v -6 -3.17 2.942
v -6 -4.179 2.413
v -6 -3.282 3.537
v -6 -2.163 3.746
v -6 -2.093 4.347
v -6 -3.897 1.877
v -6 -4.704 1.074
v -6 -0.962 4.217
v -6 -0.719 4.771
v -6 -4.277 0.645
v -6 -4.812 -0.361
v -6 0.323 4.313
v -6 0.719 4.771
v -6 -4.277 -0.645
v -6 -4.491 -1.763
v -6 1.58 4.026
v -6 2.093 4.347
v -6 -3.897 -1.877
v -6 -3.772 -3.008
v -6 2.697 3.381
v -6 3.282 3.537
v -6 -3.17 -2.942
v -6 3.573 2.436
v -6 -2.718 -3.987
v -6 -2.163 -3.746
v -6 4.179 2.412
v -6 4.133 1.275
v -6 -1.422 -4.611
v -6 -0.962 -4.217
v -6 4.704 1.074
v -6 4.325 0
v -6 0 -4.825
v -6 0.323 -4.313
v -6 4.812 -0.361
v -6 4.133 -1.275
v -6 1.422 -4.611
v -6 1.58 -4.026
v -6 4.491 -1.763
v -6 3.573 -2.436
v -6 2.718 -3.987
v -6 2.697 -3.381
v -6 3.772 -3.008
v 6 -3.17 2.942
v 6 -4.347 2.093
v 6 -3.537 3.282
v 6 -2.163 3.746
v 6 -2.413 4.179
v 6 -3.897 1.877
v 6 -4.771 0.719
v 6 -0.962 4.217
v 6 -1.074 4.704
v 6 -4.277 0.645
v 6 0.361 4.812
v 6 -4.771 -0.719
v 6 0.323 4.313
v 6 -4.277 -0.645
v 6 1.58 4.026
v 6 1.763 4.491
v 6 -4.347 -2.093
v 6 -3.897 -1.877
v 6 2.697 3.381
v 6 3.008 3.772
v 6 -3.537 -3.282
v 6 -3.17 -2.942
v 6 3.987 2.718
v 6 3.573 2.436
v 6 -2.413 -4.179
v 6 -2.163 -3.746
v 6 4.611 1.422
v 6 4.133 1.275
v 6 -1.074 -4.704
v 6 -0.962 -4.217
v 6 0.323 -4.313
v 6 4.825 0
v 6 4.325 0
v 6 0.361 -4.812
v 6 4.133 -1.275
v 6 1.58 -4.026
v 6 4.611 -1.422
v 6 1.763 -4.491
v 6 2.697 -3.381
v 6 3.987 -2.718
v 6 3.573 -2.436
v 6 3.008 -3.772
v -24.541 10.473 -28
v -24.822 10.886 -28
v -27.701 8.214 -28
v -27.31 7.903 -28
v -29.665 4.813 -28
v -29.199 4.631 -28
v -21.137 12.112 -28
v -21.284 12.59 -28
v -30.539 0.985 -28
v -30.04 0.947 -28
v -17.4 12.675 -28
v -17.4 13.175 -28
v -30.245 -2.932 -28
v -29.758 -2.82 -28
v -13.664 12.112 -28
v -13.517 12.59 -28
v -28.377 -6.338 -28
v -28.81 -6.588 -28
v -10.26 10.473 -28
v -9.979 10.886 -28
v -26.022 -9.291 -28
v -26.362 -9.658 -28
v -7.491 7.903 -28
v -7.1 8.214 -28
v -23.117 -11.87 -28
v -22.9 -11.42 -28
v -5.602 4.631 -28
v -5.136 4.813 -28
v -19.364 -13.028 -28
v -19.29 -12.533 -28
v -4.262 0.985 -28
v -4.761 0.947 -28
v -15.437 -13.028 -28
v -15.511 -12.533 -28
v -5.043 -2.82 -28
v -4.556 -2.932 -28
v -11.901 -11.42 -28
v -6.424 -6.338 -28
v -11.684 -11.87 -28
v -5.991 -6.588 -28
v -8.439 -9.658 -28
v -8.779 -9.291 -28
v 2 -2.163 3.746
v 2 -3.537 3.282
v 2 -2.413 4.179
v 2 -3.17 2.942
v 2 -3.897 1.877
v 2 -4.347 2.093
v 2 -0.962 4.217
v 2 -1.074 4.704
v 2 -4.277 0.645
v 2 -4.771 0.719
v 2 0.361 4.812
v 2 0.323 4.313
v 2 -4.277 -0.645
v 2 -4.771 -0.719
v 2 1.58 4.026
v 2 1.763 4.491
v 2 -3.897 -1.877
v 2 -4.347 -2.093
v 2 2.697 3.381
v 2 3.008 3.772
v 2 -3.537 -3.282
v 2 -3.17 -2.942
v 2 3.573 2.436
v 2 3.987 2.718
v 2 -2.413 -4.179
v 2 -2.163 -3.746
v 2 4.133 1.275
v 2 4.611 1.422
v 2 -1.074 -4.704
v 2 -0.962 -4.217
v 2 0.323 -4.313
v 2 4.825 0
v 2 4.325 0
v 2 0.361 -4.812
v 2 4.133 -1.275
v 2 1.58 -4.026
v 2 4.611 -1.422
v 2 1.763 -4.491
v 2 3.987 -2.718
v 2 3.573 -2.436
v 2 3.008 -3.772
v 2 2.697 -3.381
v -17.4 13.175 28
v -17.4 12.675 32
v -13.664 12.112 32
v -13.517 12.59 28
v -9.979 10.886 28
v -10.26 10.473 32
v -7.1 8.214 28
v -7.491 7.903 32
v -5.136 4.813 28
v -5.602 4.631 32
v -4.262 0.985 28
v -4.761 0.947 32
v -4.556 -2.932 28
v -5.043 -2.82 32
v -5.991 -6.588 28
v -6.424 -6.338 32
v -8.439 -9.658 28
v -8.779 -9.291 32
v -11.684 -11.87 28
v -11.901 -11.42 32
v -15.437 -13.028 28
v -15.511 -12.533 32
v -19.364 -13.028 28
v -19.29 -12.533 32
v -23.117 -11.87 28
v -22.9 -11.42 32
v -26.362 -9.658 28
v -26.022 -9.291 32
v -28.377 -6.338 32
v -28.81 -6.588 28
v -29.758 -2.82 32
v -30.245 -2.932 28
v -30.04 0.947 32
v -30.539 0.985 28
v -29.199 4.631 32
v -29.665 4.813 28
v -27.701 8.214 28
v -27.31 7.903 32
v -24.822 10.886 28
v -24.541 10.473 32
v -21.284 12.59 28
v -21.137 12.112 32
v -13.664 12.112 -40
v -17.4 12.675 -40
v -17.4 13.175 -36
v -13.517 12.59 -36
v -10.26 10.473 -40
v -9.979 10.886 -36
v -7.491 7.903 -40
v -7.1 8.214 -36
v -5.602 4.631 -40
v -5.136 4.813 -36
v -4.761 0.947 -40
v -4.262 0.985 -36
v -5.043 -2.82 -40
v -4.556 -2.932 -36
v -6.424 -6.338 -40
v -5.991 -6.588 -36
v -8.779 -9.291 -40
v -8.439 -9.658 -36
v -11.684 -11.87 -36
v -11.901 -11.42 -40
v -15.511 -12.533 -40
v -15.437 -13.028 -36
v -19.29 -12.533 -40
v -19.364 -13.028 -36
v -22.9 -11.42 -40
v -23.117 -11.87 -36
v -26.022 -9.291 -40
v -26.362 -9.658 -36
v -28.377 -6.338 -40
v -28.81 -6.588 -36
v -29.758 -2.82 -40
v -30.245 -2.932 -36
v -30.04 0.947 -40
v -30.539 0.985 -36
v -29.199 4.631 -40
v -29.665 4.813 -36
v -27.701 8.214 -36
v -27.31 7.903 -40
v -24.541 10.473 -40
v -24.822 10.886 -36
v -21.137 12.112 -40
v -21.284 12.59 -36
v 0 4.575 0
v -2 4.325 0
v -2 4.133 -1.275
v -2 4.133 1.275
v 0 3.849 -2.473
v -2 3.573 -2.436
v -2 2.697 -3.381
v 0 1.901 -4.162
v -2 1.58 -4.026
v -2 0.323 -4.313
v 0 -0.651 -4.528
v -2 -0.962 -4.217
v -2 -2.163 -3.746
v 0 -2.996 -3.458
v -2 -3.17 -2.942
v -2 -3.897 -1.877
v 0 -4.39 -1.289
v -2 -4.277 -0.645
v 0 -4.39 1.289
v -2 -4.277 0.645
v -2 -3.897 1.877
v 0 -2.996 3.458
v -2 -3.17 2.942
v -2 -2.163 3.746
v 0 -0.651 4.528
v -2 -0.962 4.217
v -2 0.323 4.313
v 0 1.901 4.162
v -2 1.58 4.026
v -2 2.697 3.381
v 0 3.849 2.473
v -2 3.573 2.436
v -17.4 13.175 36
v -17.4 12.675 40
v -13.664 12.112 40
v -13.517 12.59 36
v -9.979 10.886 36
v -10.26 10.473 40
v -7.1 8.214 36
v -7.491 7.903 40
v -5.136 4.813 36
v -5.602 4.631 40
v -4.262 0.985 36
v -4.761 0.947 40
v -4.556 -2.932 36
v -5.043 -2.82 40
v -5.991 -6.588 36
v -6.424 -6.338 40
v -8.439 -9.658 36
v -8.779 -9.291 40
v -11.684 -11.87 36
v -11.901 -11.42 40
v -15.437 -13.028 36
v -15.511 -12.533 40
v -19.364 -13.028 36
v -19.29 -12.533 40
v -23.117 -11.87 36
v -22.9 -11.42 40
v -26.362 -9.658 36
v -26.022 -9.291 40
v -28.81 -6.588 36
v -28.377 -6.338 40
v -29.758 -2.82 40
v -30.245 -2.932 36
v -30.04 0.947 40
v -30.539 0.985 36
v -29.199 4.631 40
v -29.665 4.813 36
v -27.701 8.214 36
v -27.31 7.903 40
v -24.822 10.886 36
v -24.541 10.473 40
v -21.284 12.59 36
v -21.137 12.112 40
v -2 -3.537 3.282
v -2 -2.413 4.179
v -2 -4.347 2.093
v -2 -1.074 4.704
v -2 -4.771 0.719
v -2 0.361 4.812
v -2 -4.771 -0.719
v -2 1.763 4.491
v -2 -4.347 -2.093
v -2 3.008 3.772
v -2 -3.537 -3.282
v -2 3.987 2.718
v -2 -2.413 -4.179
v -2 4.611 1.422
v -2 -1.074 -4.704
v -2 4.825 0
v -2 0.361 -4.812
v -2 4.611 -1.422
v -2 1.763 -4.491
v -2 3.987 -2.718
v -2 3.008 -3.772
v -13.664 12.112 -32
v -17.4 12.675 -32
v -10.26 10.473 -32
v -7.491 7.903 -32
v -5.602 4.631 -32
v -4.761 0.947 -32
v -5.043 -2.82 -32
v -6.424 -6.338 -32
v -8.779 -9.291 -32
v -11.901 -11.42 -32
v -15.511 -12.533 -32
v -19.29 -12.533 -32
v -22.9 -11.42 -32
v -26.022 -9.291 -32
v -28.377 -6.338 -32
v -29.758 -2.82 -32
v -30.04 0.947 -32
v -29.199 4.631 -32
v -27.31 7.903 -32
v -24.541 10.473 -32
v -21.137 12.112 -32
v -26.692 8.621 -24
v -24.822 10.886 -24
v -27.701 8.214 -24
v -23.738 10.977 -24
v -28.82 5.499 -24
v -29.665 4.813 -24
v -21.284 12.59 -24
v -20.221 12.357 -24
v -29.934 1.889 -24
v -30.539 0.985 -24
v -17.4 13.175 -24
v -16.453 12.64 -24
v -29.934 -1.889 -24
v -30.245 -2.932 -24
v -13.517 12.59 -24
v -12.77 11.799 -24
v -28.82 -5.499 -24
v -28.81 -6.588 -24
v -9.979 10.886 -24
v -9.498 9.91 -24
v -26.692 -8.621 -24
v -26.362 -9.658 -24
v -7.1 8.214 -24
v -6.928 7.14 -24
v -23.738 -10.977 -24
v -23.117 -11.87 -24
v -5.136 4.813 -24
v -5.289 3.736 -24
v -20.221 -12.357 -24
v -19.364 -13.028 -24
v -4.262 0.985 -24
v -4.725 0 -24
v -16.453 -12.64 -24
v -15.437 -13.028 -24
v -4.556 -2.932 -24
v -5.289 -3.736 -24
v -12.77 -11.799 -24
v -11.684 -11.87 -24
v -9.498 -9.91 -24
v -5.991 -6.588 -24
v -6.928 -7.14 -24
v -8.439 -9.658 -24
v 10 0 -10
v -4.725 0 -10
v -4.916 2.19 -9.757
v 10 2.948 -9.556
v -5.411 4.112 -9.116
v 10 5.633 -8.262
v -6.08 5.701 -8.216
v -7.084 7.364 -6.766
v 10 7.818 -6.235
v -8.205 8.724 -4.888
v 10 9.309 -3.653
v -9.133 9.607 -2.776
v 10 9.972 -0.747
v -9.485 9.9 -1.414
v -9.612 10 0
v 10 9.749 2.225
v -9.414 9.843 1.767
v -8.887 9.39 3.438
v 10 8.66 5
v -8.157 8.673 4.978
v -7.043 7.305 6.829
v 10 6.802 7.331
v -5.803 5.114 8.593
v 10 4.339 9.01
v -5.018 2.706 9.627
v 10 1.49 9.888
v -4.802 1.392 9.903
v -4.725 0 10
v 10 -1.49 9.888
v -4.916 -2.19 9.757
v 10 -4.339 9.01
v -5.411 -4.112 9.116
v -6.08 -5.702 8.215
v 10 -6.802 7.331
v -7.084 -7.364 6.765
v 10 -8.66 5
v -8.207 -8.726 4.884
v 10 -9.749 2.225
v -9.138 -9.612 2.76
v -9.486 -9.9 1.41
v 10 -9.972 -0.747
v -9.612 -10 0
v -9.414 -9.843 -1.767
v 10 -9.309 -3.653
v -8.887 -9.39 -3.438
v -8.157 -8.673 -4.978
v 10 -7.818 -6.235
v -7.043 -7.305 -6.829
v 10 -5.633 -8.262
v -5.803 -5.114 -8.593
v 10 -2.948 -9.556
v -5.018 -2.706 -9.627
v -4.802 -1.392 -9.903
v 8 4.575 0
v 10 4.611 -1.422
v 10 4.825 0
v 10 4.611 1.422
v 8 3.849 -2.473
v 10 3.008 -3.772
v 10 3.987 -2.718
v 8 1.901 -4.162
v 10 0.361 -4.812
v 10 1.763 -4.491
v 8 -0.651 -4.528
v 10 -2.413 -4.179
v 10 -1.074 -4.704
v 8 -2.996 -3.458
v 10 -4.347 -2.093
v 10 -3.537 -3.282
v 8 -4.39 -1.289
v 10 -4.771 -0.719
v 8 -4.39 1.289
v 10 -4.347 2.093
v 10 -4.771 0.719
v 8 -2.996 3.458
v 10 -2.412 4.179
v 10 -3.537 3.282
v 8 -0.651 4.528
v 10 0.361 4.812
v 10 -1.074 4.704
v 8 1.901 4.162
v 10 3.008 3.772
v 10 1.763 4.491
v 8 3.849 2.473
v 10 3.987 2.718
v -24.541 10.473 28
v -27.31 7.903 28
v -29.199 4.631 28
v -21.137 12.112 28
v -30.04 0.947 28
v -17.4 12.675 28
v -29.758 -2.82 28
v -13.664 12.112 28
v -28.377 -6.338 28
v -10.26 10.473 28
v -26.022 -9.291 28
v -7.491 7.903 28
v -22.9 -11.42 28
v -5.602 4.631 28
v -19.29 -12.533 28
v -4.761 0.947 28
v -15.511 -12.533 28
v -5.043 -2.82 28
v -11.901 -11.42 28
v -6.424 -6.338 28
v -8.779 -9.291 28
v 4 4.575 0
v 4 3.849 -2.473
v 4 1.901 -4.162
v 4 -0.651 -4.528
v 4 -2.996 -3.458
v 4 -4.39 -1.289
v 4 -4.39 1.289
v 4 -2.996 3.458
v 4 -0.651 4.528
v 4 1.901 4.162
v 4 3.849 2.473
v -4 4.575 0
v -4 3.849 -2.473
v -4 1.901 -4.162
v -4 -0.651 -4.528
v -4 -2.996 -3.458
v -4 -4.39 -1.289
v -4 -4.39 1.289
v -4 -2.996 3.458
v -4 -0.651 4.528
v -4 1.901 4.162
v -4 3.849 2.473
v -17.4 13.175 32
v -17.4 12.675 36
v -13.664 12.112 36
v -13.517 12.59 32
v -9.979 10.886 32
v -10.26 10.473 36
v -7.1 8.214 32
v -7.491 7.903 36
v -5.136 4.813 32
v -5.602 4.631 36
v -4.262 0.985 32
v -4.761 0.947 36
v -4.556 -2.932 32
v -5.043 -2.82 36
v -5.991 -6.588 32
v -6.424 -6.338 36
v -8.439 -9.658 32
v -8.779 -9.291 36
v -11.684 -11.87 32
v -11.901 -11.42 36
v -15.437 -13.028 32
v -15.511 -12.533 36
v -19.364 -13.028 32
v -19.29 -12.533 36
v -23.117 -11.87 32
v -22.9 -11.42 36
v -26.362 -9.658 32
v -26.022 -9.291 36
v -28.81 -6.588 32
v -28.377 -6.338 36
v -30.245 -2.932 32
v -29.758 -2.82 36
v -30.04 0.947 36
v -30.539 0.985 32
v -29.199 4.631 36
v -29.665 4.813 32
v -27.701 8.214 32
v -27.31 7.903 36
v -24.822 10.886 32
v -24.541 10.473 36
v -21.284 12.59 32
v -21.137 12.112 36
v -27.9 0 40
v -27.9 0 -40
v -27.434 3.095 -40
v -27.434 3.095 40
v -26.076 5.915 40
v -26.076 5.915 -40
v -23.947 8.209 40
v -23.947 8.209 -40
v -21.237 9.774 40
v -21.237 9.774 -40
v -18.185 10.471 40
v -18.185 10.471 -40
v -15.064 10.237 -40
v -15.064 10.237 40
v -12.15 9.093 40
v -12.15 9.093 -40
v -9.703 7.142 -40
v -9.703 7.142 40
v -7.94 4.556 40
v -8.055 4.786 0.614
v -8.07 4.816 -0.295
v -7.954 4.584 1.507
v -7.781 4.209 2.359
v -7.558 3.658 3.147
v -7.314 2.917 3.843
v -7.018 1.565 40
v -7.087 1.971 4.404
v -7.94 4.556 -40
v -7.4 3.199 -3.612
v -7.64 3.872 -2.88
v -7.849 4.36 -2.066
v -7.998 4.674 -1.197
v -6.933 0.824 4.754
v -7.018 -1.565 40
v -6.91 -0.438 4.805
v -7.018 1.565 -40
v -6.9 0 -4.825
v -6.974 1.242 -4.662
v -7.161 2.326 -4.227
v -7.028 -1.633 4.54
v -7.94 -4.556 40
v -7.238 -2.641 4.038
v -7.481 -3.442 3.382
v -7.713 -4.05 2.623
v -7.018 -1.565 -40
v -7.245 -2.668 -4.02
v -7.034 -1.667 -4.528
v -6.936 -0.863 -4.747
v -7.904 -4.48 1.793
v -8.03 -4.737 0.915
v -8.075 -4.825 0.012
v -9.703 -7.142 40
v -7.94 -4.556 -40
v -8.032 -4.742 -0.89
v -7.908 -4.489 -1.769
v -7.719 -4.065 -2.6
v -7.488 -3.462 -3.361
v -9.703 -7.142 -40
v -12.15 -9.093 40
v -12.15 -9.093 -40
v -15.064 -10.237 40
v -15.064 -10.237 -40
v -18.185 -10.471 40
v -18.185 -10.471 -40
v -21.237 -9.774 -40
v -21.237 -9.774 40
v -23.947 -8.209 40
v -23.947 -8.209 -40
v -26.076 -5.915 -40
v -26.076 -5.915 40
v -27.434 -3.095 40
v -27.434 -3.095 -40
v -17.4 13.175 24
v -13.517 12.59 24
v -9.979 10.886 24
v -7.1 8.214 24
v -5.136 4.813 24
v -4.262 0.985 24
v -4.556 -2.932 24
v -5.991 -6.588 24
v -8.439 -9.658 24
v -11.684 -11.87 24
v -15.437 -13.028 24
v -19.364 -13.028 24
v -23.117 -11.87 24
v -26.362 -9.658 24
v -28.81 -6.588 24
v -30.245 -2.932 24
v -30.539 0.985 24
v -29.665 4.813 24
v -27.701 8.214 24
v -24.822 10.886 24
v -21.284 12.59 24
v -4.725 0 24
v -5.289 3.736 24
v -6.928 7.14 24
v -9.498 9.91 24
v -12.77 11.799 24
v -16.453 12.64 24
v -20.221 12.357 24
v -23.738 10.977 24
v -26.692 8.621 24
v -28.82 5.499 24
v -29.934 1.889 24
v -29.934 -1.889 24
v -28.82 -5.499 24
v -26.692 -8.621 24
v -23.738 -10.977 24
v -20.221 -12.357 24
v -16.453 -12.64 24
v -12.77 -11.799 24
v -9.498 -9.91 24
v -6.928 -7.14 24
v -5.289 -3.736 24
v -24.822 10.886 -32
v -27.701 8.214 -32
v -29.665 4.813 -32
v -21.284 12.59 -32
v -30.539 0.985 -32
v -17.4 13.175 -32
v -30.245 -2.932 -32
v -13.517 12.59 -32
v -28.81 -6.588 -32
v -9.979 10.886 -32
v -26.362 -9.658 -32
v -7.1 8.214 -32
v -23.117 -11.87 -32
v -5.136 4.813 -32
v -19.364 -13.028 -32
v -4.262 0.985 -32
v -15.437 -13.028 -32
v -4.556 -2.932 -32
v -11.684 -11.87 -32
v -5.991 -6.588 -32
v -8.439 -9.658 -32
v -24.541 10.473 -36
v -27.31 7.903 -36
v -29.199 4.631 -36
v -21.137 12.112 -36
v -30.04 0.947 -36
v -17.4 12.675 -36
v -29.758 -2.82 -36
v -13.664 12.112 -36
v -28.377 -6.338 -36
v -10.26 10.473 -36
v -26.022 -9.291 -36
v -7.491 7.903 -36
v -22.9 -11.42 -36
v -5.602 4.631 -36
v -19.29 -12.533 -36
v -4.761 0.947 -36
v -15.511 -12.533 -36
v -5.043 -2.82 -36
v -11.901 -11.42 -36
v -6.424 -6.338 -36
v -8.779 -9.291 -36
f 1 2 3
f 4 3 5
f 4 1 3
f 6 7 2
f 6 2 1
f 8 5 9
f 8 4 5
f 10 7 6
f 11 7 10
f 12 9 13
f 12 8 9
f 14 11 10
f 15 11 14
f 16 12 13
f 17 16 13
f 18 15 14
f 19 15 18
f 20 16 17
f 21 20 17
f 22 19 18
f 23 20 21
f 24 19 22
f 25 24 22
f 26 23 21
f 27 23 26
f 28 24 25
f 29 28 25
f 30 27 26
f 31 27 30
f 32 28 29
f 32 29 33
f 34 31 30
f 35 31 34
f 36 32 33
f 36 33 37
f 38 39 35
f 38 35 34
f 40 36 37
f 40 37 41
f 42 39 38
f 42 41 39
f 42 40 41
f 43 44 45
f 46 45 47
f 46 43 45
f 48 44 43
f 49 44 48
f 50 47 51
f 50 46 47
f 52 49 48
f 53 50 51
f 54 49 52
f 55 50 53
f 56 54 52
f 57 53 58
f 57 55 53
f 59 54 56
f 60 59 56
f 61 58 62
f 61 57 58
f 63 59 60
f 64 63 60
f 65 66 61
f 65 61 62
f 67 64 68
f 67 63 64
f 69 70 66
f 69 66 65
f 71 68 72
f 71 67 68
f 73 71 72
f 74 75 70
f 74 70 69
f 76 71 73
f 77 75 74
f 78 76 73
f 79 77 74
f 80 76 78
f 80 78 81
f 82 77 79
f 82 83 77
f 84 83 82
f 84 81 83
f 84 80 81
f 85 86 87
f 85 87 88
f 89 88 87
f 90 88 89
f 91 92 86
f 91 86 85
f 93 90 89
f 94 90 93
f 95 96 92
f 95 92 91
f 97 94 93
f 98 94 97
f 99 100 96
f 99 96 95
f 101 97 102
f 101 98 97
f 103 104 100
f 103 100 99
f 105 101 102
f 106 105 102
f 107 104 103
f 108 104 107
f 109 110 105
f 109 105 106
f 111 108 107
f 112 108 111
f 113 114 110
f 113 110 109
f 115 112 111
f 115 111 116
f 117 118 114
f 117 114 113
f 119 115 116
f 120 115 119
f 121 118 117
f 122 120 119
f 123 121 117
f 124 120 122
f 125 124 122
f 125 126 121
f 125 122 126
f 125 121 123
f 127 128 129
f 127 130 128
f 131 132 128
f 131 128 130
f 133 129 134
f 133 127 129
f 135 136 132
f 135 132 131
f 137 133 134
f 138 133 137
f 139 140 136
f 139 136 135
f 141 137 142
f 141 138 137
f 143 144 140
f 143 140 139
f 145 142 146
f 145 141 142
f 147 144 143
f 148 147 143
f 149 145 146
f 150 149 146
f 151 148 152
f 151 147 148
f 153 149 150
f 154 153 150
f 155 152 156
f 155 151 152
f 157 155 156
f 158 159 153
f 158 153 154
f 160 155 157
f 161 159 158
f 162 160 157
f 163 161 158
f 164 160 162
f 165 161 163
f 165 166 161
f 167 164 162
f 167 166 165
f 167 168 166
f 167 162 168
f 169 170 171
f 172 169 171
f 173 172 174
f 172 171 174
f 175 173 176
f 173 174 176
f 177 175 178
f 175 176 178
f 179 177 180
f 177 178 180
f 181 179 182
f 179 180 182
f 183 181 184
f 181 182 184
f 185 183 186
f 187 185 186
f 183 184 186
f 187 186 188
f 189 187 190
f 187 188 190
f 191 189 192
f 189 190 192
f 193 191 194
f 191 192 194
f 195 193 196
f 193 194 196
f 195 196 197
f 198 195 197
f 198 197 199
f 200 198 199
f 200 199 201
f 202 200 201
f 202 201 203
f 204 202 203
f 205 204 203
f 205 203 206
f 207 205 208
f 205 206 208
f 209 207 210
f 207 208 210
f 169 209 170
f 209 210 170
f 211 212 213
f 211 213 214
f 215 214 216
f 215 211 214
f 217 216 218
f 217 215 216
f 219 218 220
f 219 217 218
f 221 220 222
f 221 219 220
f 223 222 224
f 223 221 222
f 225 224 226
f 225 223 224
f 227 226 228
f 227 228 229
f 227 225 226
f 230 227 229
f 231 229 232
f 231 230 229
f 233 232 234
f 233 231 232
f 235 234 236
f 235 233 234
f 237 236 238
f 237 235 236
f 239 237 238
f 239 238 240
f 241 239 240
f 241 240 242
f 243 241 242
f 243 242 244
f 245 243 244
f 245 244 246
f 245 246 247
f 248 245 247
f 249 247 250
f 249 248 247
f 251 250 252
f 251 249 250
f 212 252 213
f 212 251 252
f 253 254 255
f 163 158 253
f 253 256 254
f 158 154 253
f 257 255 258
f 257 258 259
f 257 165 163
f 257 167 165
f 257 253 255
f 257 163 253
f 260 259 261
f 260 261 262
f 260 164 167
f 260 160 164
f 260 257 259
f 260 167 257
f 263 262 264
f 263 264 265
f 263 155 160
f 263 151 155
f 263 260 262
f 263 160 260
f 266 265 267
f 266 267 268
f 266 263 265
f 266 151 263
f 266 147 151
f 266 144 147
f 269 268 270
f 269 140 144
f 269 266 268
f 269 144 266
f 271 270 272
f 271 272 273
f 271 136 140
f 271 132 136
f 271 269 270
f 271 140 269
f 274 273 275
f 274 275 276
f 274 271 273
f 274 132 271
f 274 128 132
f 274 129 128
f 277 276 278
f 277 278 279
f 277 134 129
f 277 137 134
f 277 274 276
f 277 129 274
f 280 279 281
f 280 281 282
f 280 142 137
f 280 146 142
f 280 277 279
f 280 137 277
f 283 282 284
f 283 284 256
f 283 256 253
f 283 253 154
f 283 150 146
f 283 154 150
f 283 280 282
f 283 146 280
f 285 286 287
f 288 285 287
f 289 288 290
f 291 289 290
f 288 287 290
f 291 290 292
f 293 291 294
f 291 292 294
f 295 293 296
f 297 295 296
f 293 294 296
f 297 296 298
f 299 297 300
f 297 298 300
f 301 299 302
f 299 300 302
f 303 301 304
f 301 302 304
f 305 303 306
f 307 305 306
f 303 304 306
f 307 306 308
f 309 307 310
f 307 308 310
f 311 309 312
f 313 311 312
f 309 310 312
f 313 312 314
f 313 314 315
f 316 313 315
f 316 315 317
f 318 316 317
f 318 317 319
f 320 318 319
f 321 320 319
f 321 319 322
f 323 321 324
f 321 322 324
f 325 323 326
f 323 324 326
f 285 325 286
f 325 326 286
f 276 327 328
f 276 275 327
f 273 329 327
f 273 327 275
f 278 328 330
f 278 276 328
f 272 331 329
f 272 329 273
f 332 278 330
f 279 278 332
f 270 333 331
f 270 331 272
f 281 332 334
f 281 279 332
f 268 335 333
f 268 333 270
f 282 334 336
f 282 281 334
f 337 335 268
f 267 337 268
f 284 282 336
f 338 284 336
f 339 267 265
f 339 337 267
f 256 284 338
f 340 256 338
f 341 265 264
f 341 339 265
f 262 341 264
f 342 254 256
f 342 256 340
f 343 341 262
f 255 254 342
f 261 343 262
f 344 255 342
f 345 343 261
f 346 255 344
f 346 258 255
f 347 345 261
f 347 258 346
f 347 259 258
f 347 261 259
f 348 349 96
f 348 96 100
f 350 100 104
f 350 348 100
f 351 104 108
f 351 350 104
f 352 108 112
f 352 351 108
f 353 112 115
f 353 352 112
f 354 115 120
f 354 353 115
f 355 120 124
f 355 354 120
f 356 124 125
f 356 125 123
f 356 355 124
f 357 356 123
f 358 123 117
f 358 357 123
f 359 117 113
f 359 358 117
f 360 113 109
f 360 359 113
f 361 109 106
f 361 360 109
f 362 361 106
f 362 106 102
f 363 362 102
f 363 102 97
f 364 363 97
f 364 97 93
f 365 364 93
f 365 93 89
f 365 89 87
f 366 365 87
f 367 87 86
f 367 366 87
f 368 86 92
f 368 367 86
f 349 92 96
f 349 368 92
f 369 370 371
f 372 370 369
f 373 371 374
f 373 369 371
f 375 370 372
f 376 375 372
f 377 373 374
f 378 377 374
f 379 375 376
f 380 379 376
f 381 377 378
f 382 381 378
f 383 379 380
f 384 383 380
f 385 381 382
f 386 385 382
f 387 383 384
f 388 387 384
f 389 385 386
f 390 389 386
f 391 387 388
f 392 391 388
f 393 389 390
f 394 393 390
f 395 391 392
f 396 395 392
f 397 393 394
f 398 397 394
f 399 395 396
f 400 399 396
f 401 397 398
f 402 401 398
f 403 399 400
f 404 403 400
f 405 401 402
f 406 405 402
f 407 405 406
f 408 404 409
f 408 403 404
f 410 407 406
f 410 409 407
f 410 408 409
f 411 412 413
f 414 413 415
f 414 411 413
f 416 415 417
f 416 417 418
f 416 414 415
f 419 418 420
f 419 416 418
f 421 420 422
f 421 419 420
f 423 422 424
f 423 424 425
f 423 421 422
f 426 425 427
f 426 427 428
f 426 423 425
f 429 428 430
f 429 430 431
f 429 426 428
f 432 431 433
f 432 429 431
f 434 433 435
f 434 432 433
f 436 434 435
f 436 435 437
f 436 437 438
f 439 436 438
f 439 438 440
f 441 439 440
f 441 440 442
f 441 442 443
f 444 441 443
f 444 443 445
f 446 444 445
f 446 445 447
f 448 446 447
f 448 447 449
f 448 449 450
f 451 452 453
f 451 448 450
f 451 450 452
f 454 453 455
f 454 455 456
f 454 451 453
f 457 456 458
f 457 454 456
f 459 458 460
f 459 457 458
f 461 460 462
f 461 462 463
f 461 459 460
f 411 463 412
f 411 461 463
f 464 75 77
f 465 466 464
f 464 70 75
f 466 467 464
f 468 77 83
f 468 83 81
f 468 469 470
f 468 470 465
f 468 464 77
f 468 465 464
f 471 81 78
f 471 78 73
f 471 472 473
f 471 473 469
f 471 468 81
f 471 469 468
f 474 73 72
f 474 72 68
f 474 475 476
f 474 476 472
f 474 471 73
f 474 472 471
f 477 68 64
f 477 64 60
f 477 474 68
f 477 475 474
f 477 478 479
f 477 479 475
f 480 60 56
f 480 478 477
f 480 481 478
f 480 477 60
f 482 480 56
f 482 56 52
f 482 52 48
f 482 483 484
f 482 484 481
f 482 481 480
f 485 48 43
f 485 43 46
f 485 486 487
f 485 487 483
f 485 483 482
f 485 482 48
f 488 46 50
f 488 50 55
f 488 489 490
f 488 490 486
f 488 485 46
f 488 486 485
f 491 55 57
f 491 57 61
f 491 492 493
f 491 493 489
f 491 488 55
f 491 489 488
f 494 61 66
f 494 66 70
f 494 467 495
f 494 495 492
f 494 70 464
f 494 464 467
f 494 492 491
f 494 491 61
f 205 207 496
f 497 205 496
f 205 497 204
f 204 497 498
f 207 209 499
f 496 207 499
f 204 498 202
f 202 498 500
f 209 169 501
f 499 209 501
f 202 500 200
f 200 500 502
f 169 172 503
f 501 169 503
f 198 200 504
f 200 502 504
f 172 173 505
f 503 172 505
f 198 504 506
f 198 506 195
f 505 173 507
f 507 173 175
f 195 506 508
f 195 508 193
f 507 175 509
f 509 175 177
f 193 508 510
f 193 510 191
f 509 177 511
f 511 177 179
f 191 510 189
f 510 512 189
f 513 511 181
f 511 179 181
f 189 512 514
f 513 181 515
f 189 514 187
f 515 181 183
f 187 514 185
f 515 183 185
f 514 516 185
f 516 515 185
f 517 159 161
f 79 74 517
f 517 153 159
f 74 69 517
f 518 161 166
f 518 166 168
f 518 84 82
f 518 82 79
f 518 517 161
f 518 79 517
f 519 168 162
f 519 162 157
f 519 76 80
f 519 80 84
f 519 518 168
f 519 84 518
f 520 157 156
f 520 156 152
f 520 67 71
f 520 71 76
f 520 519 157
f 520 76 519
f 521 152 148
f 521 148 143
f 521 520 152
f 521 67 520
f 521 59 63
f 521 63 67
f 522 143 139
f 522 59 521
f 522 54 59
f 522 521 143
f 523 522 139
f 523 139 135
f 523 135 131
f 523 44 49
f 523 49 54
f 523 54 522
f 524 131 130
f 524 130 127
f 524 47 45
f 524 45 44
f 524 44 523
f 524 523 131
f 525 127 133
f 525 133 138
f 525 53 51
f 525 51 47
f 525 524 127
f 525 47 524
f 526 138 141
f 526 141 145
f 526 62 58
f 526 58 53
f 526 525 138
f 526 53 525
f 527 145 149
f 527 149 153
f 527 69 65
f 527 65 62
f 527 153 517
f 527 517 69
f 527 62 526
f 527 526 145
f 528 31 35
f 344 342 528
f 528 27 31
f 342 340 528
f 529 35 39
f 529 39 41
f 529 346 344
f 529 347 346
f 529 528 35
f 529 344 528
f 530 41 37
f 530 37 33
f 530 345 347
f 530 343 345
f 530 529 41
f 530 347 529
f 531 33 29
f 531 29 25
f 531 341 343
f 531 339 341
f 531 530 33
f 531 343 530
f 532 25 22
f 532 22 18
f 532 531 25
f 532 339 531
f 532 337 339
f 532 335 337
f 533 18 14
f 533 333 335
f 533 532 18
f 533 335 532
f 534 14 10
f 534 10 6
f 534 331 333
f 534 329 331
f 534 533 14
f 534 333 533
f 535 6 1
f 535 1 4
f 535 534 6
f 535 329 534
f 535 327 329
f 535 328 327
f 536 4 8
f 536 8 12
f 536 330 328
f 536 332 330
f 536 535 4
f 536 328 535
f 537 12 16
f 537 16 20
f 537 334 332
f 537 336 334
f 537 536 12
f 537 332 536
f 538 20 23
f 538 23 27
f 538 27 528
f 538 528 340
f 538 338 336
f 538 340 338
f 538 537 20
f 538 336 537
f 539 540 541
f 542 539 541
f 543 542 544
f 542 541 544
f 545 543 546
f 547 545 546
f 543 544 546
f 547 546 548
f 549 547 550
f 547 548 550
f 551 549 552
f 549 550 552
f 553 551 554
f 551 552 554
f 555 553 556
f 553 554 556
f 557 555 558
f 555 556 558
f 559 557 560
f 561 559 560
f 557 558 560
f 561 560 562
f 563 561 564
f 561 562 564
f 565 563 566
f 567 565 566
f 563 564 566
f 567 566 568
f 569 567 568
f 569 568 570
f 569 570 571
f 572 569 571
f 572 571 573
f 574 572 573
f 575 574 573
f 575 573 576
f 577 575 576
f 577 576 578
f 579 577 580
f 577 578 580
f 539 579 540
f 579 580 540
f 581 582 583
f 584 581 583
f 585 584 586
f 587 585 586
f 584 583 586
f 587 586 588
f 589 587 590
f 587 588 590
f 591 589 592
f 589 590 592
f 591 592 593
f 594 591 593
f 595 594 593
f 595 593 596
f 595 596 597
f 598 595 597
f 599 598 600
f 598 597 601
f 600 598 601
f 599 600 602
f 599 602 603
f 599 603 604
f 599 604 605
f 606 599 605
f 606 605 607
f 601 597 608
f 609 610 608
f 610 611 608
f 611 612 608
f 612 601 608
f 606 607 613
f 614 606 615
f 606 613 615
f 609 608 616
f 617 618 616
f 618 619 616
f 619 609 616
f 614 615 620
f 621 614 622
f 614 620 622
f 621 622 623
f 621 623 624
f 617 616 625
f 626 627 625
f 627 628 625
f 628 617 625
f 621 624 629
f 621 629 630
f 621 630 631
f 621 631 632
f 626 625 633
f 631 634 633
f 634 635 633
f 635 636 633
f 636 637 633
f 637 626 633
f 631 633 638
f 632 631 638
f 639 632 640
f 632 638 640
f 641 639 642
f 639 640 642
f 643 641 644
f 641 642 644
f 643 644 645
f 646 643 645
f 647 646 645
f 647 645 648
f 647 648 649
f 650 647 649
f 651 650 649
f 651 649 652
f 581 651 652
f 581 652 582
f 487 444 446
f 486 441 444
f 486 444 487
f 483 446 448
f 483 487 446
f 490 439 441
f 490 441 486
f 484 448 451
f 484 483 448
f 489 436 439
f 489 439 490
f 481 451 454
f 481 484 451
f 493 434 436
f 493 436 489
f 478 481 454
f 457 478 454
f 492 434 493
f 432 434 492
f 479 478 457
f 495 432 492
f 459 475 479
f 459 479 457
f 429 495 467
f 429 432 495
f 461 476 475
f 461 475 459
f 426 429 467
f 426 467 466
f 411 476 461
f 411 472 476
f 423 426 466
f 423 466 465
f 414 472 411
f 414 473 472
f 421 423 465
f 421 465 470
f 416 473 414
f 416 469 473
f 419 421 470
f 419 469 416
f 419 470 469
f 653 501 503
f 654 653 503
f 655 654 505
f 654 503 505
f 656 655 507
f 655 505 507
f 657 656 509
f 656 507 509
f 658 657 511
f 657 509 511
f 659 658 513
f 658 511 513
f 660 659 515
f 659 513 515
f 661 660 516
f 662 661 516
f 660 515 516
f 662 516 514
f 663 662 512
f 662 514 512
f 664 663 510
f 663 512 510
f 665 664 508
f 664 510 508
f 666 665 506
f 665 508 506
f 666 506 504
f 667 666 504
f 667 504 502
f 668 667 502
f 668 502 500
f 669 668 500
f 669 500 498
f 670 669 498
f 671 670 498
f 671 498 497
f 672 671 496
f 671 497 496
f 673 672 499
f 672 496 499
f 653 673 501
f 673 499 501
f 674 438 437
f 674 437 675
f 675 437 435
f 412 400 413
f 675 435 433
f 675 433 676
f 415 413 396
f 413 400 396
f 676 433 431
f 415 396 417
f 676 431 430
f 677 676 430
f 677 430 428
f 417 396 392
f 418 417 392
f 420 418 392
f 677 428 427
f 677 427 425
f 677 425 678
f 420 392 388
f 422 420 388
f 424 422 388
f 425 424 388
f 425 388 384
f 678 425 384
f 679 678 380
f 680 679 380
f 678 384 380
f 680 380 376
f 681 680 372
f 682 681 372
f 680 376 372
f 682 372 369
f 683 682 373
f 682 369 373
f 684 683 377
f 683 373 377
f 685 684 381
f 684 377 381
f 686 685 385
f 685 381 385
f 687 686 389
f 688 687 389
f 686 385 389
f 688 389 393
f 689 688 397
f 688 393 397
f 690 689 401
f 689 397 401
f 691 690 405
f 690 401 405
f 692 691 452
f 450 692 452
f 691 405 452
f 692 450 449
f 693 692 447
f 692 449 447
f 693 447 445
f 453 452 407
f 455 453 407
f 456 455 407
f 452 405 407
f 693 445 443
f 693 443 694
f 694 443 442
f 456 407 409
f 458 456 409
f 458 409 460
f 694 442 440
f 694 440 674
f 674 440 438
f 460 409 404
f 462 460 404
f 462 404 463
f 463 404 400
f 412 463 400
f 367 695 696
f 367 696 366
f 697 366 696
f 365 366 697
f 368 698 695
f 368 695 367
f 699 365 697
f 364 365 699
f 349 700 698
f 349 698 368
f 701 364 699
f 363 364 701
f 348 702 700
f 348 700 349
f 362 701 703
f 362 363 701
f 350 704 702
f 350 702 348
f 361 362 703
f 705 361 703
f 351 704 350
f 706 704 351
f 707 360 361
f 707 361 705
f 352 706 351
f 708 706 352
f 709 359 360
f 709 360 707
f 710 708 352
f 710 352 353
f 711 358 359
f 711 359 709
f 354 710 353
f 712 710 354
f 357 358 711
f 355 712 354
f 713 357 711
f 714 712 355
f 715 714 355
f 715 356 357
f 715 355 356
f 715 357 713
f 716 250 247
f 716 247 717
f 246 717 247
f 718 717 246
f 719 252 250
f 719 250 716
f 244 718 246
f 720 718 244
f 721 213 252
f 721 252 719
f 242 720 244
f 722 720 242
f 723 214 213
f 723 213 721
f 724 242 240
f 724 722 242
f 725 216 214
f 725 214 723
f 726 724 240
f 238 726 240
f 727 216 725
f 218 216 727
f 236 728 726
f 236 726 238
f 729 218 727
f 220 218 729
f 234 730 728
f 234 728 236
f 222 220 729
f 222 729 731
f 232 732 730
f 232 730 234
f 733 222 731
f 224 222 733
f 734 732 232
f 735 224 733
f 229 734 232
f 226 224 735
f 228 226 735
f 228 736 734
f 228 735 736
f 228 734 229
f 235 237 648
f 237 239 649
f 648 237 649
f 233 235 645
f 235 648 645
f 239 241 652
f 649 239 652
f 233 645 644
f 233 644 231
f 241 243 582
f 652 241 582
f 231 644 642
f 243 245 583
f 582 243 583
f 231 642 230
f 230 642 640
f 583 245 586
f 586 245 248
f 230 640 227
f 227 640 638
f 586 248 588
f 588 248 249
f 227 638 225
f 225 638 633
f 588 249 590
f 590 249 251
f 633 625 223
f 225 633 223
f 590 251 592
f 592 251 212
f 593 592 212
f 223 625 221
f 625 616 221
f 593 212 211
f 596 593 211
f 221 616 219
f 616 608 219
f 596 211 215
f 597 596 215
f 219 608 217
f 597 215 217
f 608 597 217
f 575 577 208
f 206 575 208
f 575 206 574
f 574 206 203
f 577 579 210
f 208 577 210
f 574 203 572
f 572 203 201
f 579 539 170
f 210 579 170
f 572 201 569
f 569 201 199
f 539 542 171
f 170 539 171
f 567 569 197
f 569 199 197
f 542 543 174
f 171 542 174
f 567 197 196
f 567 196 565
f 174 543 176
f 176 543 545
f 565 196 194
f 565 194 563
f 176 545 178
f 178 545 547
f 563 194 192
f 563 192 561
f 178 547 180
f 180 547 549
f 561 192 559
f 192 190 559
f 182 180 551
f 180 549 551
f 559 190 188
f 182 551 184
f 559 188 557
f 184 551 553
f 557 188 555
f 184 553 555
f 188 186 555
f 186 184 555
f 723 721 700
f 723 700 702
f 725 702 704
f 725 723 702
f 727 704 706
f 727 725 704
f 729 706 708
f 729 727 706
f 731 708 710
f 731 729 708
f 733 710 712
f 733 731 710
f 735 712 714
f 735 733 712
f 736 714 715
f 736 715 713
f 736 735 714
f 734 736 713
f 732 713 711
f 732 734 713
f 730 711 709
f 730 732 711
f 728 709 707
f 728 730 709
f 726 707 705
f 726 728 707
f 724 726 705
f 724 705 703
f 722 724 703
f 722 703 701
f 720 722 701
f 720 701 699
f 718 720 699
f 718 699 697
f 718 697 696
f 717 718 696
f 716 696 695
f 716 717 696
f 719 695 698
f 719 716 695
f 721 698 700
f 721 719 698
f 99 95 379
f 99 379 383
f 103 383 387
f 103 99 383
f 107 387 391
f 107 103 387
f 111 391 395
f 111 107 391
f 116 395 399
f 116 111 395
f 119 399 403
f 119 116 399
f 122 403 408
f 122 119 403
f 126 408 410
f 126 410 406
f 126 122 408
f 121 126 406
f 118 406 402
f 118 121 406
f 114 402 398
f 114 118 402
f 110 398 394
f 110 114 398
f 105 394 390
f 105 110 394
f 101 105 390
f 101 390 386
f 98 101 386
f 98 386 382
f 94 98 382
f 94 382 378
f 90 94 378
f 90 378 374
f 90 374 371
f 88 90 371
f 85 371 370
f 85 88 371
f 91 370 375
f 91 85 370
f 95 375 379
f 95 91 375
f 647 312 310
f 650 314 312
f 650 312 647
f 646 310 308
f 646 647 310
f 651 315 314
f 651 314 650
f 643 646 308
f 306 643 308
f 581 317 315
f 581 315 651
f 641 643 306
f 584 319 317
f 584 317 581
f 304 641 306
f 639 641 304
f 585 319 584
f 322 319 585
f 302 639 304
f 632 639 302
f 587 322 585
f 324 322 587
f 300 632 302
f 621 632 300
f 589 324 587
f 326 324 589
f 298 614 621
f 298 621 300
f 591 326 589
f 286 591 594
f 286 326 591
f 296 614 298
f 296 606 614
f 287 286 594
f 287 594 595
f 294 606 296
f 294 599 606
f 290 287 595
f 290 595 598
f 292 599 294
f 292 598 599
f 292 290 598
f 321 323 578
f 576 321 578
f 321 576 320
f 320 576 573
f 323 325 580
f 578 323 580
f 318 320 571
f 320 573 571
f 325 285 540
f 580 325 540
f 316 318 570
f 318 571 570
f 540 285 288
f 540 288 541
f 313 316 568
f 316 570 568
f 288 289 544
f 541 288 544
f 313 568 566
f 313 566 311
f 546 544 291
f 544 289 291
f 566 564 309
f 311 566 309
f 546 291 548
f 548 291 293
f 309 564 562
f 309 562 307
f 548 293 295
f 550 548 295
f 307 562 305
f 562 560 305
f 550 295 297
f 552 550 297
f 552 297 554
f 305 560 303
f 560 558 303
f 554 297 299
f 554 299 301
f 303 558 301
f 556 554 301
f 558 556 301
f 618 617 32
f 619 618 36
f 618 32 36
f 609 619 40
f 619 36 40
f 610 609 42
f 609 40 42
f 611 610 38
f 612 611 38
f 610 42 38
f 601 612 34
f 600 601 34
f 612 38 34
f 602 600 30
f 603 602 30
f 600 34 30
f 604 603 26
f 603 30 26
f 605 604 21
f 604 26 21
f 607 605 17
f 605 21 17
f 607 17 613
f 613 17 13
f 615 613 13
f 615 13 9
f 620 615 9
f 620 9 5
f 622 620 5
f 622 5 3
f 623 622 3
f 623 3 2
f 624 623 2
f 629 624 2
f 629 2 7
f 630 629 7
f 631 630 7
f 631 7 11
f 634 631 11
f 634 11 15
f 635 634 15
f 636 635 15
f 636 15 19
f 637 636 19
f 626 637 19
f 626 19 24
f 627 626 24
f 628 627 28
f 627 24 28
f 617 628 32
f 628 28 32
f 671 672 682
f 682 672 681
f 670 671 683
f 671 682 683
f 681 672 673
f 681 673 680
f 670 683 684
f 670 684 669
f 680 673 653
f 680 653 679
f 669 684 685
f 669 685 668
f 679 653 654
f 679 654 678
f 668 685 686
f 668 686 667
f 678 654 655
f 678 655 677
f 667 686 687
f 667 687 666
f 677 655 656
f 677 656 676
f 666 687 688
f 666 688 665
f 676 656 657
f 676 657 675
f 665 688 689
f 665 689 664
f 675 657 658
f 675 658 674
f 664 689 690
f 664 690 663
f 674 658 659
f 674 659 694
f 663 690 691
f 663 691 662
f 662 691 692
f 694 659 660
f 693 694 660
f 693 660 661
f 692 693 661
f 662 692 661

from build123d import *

# Parameters (mm, degrees)
BOSS_EXTRUDE1_DEPTH      = 10
BOSS_EXTRUDE1_DEPTH_BACK = 10
SKETCH1_R                = 10
BOSS_EXTRUDE2_DEPTH      = 40
BOSS_EXTRUDE2_DEPTH_BACK = 40
SKETCH11_R               = 12.675
SKETCH12_R               = 10.5
CUT_EXTRUDE6_DEPTH       = 87.401335837
SKETCH2_R                = 4.825
CUT_EXTRUDE7_DEPTH       = 30
LPATTERN1_COUNT          = 4
LPATTERN1_PITCH          = 4
LPATTERN2_COUNT          = 4
LPATTERN2_PITCH          = 4


with BuildPart() as part:
    # Sketch1 → Boss-Extrude1 (new, two sides: drawn at the far end of the back side and taken through both)
    with BuildSketch(Plane(origin=(0, 0, 0), x_dir=(0, 0, -1), z_dir=(1, 0, 0)).offset(-BOSS_EXTRUDE1_DEPTH_BACK)):
        Circle(SKETCH1_R)
    extrude(amount=BOSS_EXTRUDE1_DEPTH + BOSS_EXTRUDE1_DEPTH_BACK)

    # Sketch11 → Boss-Extrude2 (add, two sides: drawn at the far end of the back side and taken through both)
    with BuildSketch(Plane.XY.offset(-BOSS_EXTRUDE2_DEPTH_BACK)):
        with Locations((-17.400491433, 0)):
            Circle(SKETCH11_R)
    extrude(amount=BOSS_EXTRUDE2_DEPTH + BOSS_EXTRUDE2_DEPTH_BACK)

    # Sketch12 → Cut-Extrude6 (cut, through all)
    with BuildSketch(Plane(origin=(0, 0, -40), x_dir=(-1, 0, 0), z_dir=(0, 0, -1))):
        with Locations((17.400491433, 0)):
            Circle(SKETCH12_R)
    extrude(amount=-CUT_EXTRUDE6_DEPTH, mode=Mode.SUBTRACT)

    # Sketch2 → Cut-Extrude7 (cut)
    with BuildSketch(Plane(origin=(10, 0, 0), x_dir=(0, 0, -1), z_dir=(1, 0, 0))):
        Circle(SKETCH2_R)
    extrude(amount=-CUT_EXTRUDE7_DEPTH, mode=Mode.SUBTRACT)

    # Sketch13 → Revolve1 (revolve)
    with BuildSketch(Plane.XY):
        Polygon((10, 4.825), (6, 4.825), (6, 4.325), align=None)
    revolve1 = revolve(axis=Axis((10, 0, 0), (-1, 0, 0)))

    # LPattern1: Revolve1 ×4
    with Locations(*[(-i * LPATTERN1_PITCH, 0, 0) for i in range(1, LPATTERN1_COUNT)]):
        add(revolve1)

    # Sketch17 → Revolve2 (revolve)
    with BuildSketch(Plane(origin=(-17.400491433, 0, 0), x_dir=(0, 0, -1), z_dir=(1, 0, 0))):
        Polygon((-40, 12.675), (-36, 12.675), (-36, 13.175), align=None)
    revolve2 = revolve(axis=Axis((-17.400491433, 0, 40), (0, 0, -1)))

    # LPattern2: Revolve2 ×4
    with Locations(*[(0, 0, -i * LPATTERN2_PITCH) for i in range(1, LPATTERN2_COUNT)]):
        add(revolve2)

    # Mirror1 copy 1 sketch → Mirror1 copy 1 (revolve)
    with BuildSketch(Plane(origin=(-17.400491433, 0, 4), x_dir=(0, 0, 1), z_dir=(1, 0, 0))):
        Polygon((-40, -12.675), (-36, -12.675), (-36, -13.175), align=None)
    revolve(axis=Axis((-17.400491433, 0, -36), (0, 0, -1)))

    # Mirror1 copy 2 sketch → Mirror1 copy 2 (revolve)
    with BuildSketch(Plane(origin=(-17.400491433, 0, 8), x_dir=(0, 0, 1), z_dir=(1, 0, 0))):
        Polygon((-40, -12.675), (-36, -12.675), (-36, -13.175), align=None)
    revolve(axis=Axis((-17.400491433, 0, -32), (0, 0, -1)))

    # Mirror1 copy 3 sketch → Mirror1 copy 3 (revolve)
    with BuildSketch(Plane(origin=(-17.400491433, 0, 12), x_dir=(0, 0, 1), z_dir=(1, 0, 0))):
        Polygon((-40, -12.675), (-36, -12.675), (-36, -13.175), align=None)
    revolve(axis=Axis((-17.400491433, 0, -28), (0, 0, -1)))

    # Mirror1 copy 4 sketch → Mirror1 copy 4 (revolve)
    with BuildSketch(Plane(origin=(-17.400491433, 0, 0), x_dir=(0, 0, 1), z_dir=(1, 0, 0))):
        Polygon((-40, -12.675), (-36, -12.675), (-36, -13.175), align=None)
    revolve(axis=Axis((-17.400491433, 0, -40), (0, 0, -1)))


solid = part.part
